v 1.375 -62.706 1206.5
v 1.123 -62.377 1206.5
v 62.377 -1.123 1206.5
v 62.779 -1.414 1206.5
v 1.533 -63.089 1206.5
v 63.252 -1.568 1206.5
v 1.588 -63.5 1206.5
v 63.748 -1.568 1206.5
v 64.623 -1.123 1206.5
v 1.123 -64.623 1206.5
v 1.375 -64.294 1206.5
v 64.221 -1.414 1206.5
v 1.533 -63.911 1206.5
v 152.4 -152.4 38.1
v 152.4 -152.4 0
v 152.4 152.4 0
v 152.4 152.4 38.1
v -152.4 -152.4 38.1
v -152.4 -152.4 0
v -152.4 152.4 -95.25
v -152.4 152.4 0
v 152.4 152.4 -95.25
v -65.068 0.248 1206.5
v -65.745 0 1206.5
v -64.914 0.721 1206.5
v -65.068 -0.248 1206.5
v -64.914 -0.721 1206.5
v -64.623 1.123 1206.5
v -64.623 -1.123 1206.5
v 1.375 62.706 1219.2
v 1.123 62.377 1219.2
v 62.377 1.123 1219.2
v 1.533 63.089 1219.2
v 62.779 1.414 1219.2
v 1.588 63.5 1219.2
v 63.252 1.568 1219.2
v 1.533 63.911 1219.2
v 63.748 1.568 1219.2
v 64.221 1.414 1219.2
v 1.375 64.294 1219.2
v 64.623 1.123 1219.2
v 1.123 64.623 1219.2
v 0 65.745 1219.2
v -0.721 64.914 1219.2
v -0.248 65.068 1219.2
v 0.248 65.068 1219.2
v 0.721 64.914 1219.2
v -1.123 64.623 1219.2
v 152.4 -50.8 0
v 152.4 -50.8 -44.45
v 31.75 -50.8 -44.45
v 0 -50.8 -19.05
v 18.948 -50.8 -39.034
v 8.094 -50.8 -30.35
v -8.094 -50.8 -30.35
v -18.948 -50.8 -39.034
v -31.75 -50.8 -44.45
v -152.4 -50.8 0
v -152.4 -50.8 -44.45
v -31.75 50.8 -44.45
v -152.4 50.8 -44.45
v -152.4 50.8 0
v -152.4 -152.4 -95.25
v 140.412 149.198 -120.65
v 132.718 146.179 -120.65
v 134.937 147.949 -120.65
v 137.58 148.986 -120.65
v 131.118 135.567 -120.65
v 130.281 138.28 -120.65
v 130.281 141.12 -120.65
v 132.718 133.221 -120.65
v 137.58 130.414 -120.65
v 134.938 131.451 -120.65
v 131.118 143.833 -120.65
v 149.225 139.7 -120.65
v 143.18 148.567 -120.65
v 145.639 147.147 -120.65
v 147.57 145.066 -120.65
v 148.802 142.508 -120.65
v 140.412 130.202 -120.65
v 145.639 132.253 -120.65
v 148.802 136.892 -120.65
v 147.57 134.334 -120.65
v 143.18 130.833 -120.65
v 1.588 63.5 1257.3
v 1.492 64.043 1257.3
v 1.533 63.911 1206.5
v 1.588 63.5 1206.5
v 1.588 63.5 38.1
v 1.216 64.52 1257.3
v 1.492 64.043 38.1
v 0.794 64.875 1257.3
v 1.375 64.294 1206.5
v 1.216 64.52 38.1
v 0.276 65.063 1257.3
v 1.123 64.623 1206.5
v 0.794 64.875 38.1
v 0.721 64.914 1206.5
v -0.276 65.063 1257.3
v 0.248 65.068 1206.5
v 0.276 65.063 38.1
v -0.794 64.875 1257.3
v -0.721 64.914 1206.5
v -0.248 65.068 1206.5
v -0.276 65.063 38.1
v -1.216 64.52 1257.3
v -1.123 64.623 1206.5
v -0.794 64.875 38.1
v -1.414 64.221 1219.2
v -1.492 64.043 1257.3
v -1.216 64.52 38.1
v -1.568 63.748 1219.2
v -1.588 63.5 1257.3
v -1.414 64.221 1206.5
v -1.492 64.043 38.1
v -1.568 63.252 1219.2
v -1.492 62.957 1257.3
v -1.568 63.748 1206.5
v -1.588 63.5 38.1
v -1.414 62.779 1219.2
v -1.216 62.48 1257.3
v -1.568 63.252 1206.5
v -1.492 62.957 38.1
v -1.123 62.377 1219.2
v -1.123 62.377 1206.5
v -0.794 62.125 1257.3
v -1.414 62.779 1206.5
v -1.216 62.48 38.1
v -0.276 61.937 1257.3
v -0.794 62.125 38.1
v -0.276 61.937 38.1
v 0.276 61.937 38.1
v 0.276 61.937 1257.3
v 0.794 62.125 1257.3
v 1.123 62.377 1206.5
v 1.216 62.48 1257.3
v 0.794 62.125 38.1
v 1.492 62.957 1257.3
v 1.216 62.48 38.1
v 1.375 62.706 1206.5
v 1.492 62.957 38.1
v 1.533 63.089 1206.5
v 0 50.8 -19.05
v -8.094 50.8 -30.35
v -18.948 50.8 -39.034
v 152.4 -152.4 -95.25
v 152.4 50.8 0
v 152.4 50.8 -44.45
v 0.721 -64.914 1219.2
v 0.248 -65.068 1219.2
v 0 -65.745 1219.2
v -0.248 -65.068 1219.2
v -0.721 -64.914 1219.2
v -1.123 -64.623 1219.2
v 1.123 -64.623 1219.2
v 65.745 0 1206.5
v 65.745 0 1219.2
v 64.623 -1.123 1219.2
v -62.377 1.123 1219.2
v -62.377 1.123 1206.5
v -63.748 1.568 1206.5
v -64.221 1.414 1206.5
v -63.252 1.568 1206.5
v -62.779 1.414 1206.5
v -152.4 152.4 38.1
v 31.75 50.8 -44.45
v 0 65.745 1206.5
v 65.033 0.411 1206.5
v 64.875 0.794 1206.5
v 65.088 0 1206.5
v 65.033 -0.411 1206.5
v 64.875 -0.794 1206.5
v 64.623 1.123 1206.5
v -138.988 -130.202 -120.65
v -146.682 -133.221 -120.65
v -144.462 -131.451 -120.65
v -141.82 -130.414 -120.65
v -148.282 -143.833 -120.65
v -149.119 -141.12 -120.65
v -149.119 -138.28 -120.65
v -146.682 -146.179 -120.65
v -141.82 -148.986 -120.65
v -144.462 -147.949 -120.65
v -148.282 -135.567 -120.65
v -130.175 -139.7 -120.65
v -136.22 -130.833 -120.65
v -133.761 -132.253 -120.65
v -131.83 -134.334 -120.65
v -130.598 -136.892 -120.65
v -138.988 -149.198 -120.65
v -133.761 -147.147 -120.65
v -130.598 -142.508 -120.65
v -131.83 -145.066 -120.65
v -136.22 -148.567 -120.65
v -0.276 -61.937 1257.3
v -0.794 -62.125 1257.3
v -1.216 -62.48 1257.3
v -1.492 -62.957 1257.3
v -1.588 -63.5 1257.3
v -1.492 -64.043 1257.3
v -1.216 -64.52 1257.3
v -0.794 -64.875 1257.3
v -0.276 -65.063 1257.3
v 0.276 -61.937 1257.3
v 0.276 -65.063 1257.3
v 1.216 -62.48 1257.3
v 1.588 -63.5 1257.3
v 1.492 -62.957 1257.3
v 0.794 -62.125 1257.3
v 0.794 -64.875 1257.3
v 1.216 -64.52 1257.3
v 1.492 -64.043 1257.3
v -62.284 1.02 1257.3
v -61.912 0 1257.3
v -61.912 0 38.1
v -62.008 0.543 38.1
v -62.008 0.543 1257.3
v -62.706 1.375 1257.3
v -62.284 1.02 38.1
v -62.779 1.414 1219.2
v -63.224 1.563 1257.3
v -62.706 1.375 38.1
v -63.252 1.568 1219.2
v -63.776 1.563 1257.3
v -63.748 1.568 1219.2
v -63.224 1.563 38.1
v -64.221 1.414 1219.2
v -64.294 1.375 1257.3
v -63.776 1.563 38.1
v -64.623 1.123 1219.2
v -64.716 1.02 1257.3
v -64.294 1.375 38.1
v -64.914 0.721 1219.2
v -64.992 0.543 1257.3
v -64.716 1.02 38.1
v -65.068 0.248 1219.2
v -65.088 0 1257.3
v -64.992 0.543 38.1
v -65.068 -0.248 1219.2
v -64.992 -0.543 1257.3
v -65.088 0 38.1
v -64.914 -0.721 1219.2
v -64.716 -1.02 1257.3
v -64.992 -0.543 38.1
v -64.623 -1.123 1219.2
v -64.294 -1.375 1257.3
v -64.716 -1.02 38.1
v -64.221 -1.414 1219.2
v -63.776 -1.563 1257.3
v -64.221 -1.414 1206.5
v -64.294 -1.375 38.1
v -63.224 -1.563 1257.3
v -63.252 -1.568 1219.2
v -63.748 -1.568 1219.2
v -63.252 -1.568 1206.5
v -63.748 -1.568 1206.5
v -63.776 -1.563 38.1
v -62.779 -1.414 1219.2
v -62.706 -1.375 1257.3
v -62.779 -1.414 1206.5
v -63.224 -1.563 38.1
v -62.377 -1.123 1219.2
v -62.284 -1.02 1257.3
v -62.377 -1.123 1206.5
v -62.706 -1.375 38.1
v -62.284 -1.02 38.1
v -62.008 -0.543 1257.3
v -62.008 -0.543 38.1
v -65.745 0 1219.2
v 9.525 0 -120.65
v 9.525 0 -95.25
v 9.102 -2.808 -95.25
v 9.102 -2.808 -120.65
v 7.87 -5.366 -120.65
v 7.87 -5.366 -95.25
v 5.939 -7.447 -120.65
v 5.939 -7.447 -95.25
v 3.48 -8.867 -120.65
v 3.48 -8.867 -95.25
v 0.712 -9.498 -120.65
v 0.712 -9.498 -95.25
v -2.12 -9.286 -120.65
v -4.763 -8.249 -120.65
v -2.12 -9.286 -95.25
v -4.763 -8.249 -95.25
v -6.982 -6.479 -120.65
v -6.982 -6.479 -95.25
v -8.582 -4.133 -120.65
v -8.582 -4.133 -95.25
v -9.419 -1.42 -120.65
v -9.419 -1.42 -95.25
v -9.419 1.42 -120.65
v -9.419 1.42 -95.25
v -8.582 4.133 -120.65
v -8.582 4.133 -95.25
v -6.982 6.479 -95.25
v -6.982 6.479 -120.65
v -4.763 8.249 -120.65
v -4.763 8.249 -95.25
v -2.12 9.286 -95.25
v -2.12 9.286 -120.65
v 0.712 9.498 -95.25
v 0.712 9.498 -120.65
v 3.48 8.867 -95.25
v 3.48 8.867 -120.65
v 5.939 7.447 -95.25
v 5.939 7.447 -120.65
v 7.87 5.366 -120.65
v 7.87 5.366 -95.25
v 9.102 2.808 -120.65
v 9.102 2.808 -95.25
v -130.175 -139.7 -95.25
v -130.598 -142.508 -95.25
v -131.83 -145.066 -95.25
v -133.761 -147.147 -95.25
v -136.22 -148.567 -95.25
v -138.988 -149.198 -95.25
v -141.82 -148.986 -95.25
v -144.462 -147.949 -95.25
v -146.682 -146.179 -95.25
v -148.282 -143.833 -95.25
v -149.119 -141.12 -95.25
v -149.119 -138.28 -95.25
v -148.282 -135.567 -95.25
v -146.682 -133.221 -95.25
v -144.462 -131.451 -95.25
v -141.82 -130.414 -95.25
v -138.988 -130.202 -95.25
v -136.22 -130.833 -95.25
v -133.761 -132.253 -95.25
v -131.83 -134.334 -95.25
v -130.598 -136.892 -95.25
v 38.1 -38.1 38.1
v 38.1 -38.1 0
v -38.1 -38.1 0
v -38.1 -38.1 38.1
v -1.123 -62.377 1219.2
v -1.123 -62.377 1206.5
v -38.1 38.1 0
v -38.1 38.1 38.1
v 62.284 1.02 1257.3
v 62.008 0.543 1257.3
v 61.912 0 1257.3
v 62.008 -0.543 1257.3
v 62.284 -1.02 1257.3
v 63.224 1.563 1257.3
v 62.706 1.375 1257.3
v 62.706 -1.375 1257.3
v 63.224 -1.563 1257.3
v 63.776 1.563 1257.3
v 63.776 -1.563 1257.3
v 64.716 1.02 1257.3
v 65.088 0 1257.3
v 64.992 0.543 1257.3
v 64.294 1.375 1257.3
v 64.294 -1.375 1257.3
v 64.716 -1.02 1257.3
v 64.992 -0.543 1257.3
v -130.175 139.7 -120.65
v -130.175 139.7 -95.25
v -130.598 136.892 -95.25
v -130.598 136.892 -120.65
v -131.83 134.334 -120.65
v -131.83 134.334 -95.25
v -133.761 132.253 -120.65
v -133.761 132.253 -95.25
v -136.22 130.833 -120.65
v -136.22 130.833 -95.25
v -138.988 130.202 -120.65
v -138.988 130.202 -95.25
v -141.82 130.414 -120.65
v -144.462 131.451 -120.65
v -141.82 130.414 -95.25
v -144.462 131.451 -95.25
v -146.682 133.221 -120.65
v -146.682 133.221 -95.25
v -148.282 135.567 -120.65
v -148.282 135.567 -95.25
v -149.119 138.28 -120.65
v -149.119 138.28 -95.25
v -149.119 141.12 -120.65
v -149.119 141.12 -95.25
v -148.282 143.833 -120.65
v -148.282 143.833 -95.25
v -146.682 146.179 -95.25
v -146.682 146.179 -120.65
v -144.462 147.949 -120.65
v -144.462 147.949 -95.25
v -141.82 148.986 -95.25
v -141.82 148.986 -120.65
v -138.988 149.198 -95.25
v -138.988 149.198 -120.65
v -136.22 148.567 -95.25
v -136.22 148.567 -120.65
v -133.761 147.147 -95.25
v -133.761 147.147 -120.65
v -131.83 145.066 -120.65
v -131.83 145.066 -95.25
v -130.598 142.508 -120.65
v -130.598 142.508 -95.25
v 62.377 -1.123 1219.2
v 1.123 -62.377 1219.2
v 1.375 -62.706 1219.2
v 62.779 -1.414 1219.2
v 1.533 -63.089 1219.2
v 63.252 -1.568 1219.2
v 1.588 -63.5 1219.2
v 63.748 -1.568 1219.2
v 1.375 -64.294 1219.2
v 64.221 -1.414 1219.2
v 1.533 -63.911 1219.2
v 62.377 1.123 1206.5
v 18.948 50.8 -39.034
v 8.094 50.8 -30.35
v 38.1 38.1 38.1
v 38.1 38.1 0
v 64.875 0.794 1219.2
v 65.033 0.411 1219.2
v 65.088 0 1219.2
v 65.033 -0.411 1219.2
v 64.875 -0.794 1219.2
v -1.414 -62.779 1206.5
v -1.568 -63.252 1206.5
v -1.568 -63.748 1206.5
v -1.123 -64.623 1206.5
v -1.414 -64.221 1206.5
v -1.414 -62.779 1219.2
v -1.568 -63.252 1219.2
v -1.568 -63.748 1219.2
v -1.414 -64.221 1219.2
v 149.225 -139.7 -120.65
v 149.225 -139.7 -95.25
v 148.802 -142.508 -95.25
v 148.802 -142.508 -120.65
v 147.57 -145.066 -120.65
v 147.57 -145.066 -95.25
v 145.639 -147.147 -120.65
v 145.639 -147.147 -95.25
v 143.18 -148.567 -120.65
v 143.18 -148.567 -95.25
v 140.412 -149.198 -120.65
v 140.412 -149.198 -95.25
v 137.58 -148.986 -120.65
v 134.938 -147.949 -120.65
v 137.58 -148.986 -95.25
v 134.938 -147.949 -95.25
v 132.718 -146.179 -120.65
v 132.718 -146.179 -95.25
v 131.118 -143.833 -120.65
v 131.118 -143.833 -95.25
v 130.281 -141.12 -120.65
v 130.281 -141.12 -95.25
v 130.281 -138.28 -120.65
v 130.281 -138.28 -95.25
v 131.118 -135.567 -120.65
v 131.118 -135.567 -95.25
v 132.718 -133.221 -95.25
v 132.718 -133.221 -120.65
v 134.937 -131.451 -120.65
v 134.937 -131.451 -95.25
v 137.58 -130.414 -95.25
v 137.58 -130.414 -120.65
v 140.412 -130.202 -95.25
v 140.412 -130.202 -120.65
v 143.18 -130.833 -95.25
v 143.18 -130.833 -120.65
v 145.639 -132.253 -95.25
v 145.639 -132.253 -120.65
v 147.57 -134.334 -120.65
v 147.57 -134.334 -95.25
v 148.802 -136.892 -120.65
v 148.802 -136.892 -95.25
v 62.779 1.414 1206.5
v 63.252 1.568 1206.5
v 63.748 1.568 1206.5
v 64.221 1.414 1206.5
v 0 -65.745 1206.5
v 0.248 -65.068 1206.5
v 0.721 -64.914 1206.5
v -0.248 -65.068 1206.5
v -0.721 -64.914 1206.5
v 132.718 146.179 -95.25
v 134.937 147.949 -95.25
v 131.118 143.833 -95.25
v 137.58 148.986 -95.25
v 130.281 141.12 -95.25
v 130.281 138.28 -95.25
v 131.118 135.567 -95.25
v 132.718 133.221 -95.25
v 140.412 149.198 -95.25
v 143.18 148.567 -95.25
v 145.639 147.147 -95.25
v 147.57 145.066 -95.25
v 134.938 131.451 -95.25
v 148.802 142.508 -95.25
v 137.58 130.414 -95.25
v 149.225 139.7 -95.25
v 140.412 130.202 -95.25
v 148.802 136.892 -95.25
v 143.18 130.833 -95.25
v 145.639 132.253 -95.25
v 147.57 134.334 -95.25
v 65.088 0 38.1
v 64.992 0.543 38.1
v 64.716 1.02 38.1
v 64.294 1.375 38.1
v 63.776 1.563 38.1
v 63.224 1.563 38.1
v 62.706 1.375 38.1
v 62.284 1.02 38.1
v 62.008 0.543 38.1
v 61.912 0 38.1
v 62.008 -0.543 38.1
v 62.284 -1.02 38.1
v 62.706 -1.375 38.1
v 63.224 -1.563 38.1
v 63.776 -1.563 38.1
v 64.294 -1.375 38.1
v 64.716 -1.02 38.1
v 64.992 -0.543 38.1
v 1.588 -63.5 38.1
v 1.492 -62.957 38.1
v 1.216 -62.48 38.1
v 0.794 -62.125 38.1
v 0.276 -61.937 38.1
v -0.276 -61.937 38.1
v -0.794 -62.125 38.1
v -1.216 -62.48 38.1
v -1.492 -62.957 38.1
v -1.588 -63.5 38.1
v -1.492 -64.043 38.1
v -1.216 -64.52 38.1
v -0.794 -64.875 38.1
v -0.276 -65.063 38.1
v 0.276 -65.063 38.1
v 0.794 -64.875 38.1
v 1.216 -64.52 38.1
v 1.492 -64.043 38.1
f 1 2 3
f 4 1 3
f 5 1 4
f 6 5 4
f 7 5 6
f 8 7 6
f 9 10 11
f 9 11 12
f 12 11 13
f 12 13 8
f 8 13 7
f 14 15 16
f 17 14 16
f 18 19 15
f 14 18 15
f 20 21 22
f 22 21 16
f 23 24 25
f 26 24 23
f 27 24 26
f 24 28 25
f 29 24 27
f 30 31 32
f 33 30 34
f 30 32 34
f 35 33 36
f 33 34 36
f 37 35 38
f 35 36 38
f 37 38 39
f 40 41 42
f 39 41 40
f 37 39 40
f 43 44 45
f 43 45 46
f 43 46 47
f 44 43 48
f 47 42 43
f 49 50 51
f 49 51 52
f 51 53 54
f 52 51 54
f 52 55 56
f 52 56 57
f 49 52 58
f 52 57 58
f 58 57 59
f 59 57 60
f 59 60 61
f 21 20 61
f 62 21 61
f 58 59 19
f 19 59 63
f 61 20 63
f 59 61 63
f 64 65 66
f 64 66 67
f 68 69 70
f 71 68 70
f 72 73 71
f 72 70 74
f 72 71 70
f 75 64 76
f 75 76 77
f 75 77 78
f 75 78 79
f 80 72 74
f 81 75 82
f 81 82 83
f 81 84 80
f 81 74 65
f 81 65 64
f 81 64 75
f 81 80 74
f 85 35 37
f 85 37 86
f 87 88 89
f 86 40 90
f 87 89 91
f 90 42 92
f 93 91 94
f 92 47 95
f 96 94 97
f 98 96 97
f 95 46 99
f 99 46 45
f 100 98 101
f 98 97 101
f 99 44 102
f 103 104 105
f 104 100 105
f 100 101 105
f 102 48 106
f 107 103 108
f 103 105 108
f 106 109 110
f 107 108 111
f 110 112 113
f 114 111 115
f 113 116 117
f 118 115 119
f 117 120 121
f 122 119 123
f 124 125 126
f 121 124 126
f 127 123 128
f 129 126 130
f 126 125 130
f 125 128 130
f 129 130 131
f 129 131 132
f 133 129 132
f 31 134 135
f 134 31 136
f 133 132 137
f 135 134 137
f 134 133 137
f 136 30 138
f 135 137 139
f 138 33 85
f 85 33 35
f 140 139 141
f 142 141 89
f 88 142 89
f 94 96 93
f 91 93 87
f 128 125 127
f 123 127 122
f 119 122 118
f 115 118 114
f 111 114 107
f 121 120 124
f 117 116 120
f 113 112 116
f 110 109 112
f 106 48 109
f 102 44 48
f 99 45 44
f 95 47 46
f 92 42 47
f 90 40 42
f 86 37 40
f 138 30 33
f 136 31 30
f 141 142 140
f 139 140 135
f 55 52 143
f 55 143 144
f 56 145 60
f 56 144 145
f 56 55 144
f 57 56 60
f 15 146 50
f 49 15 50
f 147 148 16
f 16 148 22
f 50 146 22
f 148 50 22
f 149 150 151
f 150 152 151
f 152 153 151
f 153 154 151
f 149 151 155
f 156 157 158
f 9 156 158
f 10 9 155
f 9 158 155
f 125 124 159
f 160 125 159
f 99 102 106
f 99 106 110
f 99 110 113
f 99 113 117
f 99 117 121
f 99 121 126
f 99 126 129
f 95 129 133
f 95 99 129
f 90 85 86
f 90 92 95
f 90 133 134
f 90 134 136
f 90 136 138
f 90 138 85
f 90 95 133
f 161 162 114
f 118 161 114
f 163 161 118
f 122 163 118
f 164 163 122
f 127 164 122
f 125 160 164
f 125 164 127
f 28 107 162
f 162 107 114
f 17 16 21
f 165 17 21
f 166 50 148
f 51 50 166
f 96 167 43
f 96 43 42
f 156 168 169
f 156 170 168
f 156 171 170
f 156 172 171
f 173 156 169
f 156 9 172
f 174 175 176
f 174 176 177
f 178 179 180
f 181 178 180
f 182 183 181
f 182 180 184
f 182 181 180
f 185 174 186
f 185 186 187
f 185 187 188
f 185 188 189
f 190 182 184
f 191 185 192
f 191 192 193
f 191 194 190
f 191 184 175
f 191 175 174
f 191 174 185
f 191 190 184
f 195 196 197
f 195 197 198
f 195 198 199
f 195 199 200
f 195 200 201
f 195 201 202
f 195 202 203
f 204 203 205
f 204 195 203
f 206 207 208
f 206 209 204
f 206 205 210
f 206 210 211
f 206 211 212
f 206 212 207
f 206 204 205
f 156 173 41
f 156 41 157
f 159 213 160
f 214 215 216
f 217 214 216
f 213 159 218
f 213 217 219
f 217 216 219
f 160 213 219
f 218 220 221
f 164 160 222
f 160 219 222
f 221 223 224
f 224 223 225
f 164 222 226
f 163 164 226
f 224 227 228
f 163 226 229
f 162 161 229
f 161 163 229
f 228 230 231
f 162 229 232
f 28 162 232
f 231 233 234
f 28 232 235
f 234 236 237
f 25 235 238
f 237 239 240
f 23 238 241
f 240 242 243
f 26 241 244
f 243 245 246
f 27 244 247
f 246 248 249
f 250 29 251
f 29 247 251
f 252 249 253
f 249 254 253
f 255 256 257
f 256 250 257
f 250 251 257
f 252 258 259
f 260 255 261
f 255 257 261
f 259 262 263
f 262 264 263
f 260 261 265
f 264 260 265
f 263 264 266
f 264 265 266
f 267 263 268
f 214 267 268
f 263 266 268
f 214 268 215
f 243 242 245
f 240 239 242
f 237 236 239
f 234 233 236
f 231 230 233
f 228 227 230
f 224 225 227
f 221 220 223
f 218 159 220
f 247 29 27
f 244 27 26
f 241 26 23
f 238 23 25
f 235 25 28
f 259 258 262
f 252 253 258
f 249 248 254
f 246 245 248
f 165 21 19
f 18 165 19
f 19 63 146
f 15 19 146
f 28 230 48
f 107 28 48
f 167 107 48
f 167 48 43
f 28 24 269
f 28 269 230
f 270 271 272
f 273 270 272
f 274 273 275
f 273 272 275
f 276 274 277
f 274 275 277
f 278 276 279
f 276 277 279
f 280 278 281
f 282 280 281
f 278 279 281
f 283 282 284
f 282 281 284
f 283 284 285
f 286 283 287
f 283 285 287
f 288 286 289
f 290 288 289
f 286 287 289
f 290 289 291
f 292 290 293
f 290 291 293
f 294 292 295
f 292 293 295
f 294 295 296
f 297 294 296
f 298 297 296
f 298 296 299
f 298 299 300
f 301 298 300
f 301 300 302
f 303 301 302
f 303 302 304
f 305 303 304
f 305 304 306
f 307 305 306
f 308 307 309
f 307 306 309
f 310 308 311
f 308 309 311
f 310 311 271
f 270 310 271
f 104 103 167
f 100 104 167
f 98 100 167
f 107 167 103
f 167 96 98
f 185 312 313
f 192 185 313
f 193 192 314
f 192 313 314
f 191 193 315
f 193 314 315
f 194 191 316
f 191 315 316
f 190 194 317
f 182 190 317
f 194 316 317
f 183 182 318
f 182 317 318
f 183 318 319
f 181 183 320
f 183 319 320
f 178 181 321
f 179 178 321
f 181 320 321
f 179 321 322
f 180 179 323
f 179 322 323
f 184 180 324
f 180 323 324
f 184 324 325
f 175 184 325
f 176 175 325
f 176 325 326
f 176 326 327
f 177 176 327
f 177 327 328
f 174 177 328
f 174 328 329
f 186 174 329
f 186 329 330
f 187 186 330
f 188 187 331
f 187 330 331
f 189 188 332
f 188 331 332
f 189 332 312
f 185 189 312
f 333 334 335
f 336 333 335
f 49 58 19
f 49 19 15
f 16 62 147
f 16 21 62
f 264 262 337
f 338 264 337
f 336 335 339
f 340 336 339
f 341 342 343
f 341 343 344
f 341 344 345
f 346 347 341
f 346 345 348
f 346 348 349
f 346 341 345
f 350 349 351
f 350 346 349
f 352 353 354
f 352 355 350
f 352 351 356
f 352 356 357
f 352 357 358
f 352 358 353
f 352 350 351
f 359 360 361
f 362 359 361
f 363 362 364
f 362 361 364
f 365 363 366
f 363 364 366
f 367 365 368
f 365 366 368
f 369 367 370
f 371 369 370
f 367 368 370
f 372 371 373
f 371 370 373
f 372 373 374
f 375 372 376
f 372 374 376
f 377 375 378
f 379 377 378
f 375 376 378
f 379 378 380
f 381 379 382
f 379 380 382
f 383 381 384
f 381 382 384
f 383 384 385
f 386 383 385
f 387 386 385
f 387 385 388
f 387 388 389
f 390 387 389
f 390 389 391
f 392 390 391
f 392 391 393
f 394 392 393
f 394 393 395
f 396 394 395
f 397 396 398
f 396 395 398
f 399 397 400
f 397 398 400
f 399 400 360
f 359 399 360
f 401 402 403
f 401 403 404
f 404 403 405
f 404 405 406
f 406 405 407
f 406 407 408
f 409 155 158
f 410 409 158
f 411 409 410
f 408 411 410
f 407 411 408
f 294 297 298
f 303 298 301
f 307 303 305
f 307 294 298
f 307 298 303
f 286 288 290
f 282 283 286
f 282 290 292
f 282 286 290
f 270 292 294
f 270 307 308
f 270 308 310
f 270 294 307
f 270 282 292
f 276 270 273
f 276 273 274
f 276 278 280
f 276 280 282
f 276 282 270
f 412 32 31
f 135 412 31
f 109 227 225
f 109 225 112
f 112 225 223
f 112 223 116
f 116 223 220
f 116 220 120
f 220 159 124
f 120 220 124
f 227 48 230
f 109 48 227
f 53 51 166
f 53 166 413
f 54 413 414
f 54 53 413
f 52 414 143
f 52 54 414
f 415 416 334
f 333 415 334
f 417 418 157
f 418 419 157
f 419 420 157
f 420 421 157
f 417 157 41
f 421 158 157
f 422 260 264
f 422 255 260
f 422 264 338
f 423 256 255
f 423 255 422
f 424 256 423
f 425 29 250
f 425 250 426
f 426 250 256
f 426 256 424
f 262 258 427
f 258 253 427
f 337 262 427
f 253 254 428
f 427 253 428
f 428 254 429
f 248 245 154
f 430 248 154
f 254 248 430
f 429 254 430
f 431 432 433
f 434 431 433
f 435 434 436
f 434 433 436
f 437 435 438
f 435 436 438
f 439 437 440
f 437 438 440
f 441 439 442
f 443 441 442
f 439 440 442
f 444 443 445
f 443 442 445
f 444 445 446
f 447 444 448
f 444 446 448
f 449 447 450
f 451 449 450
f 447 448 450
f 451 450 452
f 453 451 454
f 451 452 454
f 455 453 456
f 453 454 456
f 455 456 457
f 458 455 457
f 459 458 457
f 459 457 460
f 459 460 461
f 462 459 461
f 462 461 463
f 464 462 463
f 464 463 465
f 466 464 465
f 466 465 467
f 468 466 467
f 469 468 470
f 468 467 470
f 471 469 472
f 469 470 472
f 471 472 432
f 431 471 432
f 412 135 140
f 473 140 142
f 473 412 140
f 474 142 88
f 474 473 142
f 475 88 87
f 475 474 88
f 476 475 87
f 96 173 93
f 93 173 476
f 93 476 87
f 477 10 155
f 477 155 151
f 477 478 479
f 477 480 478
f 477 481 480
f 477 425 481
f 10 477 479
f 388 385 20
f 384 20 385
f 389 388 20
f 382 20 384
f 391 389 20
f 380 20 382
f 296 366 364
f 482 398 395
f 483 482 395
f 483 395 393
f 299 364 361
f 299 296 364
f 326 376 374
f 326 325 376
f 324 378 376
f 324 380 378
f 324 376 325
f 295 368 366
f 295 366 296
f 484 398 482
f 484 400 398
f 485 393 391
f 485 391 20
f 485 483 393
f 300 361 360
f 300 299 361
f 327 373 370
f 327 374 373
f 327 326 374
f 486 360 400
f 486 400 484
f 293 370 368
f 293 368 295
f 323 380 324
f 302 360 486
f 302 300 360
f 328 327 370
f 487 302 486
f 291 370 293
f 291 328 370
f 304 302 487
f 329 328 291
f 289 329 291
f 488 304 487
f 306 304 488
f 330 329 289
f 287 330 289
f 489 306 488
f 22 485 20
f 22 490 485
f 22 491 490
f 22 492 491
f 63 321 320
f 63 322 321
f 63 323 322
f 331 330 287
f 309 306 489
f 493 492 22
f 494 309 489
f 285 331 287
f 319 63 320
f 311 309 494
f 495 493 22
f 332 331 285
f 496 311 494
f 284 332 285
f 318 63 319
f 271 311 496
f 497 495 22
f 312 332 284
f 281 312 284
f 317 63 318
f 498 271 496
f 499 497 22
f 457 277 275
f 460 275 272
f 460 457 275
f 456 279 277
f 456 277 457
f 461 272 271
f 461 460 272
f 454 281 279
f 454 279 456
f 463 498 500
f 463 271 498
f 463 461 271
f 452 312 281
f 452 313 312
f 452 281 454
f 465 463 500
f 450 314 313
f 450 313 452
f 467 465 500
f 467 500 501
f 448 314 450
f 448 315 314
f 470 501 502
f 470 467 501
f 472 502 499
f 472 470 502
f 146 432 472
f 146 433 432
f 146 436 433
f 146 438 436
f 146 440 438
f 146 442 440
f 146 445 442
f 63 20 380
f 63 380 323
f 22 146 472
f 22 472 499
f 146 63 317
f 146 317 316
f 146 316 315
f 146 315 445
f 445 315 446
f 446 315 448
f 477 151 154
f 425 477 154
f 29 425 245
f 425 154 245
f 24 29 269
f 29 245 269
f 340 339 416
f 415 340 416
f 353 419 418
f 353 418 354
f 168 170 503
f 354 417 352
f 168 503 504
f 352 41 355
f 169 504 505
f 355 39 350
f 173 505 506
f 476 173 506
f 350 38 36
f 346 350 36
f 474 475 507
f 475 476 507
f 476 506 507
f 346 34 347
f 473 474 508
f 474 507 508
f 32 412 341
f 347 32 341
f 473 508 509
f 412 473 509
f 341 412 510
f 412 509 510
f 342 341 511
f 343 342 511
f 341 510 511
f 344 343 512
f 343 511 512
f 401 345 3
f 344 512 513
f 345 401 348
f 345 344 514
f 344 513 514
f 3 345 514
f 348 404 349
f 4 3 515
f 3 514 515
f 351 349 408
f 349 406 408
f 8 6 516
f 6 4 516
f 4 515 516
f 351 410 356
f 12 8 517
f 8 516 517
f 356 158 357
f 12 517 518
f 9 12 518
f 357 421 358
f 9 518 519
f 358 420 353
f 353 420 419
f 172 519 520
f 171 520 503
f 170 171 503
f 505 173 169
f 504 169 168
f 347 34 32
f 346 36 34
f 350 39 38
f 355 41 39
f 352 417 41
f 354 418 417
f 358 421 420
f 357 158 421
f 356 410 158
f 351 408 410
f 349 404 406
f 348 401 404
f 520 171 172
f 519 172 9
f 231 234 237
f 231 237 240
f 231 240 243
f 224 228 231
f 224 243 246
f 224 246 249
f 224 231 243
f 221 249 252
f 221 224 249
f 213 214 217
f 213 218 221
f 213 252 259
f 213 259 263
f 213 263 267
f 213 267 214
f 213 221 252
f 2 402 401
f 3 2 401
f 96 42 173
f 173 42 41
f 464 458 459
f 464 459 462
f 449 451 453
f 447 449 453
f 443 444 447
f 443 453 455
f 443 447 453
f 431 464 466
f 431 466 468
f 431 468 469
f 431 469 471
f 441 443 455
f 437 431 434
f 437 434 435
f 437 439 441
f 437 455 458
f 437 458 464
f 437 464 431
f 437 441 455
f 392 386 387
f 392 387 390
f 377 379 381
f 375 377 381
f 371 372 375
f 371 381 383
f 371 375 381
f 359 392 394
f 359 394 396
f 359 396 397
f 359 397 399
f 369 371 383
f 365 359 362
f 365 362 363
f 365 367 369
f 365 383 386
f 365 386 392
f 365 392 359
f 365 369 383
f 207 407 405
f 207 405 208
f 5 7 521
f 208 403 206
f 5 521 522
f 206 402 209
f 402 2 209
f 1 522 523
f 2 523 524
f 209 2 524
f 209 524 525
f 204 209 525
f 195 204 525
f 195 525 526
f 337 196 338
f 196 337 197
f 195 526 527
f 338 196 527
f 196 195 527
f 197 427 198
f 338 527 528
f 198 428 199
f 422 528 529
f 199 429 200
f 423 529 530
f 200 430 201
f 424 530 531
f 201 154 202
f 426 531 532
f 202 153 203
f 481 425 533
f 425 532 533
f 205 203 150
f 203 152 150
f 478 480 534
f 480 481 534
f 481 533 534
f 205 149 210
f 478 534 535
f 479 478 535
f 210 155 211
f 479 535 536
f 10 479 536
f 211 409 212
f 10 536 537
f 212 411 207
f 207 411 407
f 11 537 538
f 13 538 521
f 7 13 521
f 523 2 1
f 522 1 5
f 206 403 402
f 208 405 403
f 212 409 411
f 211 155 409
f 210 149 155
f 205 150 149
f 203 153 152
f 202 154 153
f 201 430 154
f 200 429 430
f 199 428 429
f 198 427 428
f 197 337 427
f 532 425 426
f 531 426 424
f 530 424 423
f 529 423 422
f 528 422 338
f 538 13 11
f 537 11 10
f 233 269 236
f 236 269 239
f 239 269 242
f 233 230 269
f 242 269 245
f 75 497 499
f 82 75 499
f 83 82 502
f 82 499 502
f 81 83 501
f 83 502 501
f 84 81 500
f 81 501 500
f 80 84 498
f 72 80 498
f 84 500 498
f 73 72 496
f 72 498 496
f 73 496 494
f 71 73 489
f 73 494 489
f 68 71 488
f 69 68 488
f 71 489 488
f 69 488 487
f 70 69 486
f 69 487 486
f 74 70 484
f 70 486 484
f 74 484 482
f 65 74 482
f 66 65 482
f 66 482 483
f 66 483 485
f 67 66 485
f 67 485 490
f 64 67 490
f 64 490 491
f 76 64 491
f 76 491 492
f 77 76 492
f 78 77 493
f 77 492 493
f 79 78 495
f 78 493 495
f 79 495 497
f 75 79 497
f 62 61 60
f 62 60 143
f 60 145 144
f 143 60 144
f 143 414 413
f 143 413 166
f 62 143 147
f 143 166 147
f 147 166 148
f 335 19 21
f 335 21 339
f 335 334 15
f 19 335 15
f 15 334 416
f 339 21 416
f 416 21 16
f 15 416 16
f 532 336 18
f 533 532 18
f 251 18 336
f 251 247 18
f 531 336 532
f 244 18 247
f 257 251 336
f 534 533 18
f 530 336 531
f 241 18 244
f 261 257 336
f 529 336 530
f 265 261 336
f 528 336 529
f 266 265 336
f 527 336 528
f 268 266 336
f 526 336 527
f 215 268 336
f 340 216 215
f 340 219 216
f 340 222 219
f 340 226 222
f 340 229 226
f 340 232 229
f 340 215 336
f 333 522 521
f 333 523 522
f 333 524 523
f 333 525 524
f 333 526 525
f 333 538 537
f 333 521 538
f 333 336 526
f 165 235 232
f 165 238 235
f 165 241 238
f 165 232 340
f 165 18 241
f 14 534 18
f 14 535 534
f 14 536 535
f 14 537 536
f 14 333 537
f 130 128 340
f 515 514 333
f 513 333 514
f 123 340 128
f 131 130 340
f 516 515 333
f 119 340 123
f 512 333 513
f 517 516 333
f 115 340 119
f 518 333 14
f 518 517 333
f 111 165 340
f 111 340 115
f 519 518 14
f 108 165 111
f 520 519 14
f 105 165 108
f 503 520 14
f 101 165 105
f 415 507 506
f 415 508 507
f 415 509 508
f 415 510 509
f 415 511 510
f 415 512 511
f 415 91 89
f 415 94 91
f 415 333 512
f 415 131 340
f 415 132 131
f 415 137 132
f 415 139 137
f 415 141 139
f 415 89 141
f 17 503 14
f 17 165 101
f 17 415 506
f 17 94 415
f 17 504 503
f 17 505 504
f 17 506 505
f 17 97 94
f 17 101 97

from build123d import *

# Parameters (mm, degrees)
F1_DEPTH  = 38.1
F3_DEPTH  = 152.4
F5_DEPTH  = 44.45
F6_R      = 9.525
F7_DEPTH  = 25.4
F8_R      = 1.5875
F9_DEPTH  = 1219.2
F12_DEPTH = 12.7


with BuildPart() as f1:
    # F0 (on Top) → F1 (new body)
    with BuildSketch(Plane.XY):
        Polygon((-152.4, 152.4), (-152.4, 0), (-152.4, -152.4), (152.4, -152.4), (152.4, 0), (152.4, 152.4), align=None)
        Polygon((-38.1, 38.1), (0, 38.1), (38.1, 38.1), (38.1, -38.1), (-38.1, -38.1), align=None, mode=Mode.SUBTRACT)
    extrude(amount=F1_DEPTH)

    # F8 (on face) → F9 (join)
    with BuildSketch(Plane.XY.offset(38.1)):
        with Locations((0, 63.5)):
            Circle(F8_R)
        with Locations((63.5, 0)):
            Circle(F8_R)
        with Locations((-63.5, 0)):
            Circle(F8_R)
        with Locations((0, -63.5)):
            Circle(F8_R)
    extrude(amount=F9_DEPTH)

    # F11 (on offset) → F12 (join)
    with BuildSketch(Plane(origin=(0, 0, 1219.2), x_dir=(1, 0, 0), z_dir=(0, 0, -1))):
        Polygon((0, -65.7450640303), (1.1225320151, -64.6225320151), (64.6225320151, -1.1225320151), (65.7450640303, 0), (1.1225320151, 64.6225320151), (0, 65.7450640303), (-65.7450640303, 0), (-64.6225320151, -1.1225320151), align=None)
        Polygon((0, -63.5), (-63.5, 0), (0, 63.5), (63.5, 0), align=None, mode=Mode.SUBTRACT)
    extrude(amount=F12_DEPTH)


with BuildPart() as f3:
    # F2 (on Front) → F3 (new body, symmetric)
    with BuildSketch(Plane.XZ):
        with BuildLine():
            ThreePointArc((31.75, -44.45), (13.2229437572, -35.0650703036), (0, -19.05))
            Line((0, -19.05), (0, -44.45))
            Line((0, -44.45), (31.75, -44.45))
        make_face()
        with BuildLine():
            Line((0, -44.45), (0, -19.05))
            ThreePointArc((0, -19.05), (-13.2229437572, -35.0650703036), (-31.75, -44.45))
            Line((-31.75, -44.45), (0, -44.45))
        make_face()
        Polygon((31.75, -44.45), (0, -44.45), (-31.75, -44.45), (-152.4, -44.45), (-152.4, -95.25), (152.4, -95.25), (152.4, -44.45), align=None)
    extrude(amount=F3_DEPTH, both=True)

    # F4 (on face) → F5 (join)
    with BuildSketch(Plane.XY.offset(-44.45)):
        Polygon((152.4, -50.8), (0, -50.8), (-152.4, -50.8), (-152.4, -152.4), (152.4, -152.4), align=None)
        Polygon((-152.4, 50.8), (0, 50.8), (152.4, 50.8), (152.4, 152.4), (-152.4, 152.4), align=None)
    extrude(amount=F5_DEPTH)

    # F6 (on face) → F7 (join)
    with BuildSketch(Plane(origin=(0, 0, -95.25), x_dir=(1, 0, 0), z_dir=(0, 0, -1))):
        with Locations((-139.7, 139.7)):
            Circle(F6_R)
        with Locations((139.7, 139.7)):
            Circle(F6_R)
        with Locations((139.7, -139.7)):
            Circle(F6_R)
        with Locations((-139.7, -139.7)):
            Circle(F6_R)
        Circle(F6_R)
    extrude(amount=F7_DEPTH)


solid = Compound([f1.part, f3.part])
